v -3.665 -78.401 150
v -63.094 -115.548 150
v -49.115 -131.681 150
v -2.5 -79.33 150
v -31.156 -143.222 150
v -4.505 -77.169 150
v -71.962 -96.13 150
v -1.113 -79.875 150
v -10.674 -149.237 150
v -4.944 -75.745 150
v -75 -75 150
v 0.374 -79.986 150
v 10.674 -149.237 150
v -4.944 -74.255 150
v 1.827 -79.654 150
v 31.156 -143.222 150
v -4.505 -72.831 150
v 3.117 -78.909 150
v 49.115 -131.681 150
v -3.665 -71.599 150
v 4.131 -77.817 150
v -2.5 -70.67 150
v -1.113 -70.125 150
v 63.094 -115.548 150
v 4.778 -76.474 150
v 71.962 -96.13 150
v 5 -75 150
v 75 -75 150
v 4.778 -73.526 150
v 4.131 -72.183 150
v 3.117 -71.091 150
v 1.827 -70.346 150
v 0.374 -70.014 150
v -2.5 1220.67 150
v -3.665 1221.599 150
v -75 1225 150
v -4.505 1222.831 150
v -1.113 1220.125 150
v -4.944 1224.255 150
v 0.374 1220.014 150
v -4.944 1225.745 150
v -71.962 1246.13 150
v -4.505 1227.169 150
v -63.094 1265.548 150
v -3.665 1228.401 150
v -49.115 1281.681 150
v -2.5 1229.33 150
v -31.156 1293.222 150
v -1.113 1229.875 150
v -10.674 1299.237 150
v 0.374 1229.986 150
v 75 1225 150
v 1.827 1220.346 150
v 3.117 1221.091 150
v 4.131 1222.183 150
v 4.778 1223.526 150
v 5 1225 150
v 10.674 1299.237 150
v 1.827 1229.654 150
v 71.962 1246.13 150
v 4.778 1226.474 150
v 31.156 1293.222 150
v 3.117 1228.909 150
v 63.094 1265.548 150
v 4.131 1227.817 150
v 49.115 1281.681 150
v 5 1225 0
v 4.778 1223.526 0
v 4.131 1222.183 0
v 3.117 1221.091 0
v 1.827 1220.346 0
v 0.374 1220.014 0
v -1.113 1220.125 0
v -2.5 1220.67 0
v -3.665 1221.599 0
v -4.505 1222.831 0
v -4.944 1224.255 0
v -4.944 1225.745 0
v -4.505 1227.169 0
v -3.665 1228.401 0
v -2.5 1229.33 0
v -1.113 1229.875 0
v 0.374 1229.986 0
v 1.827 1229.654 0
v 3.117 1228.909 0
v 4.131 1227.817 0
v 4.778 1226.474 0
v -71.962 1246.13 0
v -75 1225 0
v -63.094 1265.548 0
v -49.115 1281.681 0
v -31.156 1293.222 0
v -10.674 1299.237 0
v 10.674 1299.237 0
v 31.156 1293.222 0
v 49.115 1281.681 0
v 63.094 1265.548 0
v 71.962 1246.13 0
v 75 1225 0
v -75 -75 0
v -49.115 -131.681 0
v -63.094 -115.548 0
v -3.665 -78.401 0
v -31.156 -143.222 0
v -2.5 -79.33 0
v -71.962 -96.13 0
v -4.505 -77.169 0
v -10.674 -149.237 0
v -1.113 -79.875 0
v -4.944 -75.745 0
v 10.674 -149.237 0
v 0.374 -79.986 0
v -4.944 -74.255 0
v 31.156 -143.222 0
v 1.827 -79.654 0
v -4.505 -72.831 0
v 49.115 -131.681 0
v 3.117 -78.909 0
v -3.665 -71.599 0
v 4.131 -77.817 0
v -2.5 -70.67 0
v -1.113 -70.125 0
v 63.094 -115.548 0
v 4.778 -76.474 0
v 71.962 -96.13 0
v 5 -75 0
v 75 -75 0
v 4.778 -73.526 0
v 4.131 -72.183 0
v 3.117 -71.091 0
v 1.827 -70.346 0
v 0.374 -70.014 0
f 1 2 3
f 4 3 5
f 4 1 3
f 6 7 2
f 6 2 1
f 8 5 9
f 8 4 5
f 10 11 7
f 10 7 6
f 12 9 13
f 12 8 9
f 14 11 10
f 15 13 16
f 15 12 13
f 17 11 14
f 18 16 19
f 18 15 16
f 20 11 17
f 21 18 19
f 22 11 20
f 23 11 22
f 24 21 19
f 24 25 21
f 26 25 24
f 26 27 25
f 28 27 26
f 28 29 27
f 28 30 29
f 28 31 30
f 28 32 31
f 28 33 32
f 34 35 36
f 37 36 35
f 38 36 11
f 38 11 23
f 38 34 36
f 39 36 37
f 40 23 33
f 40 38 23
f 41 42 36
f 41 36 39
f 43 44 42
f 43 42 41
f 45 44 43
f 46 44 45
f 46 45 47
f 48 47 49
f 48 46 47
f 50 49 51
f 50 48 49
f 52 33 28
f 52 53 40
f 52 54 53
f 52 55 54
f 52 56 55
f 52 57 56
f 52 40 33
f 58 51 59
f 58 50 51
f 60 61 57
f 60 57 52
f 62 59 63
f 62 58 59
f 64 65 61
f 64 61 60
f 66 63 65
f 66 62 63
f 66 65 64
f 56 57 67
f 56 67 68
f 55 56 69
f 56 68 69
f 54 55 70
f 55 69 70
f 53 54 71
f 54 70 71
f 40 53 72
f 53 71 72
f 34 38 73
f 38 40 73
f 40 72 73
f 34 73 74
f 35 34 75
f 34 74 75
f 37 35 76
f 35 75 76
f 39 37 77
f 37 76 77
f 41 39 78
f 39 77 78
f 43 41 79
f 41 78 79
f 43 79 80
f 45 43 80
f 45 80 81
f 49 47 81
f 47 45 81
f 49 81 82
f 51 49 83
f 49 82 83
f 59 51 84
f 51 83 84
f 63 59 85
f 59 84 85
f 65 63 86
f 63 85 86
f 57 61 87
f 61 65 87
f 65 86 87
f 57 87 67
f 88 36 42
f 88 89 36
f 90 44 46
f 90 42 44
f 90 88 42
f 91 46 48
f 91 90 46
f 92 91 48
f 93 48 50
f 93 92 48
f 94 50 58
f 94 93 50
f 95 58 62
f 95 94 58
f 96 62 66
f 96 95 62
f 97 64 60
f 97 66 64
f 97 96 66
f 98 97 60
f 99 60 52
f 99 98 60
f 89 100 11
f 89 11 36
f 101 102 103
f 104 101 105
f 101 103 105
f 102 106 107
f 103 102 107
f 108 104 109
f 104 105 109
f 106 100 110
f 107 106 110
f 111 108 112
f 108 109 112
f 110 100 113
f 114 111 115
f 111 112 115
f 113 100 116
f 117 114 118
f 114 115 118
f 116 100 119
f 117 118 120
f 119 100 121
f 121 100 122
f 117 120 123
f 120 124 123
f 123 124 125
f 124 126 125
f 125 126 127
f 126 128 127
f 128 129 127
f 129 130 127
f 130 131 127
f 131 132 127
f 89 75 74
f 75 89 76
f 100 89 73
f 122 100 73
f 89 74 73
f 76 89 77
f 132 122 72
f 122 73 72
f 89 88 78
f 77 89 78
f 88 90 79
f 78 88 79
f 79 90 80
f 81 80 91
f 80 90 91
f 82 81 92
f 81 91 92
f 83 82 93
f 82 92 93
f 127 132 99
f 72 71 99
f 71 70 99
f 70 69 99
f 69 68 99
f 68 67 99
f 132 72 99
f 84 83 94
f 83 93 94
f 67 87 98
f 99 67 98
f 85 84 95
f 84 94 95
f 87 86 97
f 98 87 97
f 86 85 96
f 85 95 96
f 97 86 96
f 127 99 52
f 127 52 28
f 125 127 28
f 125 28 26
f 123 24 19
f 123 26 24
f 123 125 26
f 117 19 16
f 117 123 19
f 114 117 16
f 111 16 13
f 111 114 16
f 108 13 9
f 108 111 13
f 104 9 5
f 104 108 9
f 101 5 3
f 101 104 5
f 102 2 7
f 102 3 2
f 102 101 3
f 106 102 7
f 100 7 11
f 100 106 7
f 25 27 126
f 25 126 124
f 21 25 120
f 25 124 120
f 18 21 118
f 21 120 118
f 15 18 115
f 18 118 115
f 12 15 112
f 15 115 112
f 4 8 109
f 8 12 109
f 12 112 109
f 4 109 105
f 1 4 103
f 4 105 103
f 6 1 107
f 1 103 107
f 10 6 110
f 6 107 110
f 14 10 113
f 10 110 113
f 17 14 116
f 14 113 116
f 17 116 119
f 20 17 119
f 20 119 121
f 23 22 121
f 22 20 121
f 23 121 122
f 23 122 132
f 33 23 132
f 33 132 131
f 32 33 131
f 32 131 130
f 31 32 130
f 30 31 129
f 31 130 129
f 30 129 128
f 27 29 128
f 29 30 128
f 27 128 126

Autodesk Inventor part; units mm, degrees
ref_plane "YZ Plane" through (0, 0, 0) normal (1, 0, 0) x (0, 1, 0)
ref_plane "XZ Plane" through (0, 0, 0) normal (0, 1, 0) x (-1, 0, 0)
ref_plane "XY Plane" through (0, 0, 0) normal (0, 0, 1) x (1, 0, 0)
sketch "Sketch1" plane through (0, 0, 0) normal (0, 0, 1) x (1, 0, 0)
  circle A0 centre (0, -75) radius 5
  arc A1 (-75, -75) -> (75, -75) centre (0, -75) ccw
  line L0 (-75, -75) -> (-75, 1225)
  arc A2 (75, 1225) -> (-75, 1225) centre (0, 1225) ccw
  circle A3 centre (0, 1225) radius 5
  line L1 (75, 1225) -> (75, -75)
  point P0 (0, 0)
  dimension "d0" = 10
  dimension "d1" = 150
  dimension "d3" = 1300
  dimension "d4" = 75
extrude "Extrusion1" add sketch "Sketch1" along normal blind 150
equation "\"d4\" = 0.5 * d1"
properties part number "link2"
